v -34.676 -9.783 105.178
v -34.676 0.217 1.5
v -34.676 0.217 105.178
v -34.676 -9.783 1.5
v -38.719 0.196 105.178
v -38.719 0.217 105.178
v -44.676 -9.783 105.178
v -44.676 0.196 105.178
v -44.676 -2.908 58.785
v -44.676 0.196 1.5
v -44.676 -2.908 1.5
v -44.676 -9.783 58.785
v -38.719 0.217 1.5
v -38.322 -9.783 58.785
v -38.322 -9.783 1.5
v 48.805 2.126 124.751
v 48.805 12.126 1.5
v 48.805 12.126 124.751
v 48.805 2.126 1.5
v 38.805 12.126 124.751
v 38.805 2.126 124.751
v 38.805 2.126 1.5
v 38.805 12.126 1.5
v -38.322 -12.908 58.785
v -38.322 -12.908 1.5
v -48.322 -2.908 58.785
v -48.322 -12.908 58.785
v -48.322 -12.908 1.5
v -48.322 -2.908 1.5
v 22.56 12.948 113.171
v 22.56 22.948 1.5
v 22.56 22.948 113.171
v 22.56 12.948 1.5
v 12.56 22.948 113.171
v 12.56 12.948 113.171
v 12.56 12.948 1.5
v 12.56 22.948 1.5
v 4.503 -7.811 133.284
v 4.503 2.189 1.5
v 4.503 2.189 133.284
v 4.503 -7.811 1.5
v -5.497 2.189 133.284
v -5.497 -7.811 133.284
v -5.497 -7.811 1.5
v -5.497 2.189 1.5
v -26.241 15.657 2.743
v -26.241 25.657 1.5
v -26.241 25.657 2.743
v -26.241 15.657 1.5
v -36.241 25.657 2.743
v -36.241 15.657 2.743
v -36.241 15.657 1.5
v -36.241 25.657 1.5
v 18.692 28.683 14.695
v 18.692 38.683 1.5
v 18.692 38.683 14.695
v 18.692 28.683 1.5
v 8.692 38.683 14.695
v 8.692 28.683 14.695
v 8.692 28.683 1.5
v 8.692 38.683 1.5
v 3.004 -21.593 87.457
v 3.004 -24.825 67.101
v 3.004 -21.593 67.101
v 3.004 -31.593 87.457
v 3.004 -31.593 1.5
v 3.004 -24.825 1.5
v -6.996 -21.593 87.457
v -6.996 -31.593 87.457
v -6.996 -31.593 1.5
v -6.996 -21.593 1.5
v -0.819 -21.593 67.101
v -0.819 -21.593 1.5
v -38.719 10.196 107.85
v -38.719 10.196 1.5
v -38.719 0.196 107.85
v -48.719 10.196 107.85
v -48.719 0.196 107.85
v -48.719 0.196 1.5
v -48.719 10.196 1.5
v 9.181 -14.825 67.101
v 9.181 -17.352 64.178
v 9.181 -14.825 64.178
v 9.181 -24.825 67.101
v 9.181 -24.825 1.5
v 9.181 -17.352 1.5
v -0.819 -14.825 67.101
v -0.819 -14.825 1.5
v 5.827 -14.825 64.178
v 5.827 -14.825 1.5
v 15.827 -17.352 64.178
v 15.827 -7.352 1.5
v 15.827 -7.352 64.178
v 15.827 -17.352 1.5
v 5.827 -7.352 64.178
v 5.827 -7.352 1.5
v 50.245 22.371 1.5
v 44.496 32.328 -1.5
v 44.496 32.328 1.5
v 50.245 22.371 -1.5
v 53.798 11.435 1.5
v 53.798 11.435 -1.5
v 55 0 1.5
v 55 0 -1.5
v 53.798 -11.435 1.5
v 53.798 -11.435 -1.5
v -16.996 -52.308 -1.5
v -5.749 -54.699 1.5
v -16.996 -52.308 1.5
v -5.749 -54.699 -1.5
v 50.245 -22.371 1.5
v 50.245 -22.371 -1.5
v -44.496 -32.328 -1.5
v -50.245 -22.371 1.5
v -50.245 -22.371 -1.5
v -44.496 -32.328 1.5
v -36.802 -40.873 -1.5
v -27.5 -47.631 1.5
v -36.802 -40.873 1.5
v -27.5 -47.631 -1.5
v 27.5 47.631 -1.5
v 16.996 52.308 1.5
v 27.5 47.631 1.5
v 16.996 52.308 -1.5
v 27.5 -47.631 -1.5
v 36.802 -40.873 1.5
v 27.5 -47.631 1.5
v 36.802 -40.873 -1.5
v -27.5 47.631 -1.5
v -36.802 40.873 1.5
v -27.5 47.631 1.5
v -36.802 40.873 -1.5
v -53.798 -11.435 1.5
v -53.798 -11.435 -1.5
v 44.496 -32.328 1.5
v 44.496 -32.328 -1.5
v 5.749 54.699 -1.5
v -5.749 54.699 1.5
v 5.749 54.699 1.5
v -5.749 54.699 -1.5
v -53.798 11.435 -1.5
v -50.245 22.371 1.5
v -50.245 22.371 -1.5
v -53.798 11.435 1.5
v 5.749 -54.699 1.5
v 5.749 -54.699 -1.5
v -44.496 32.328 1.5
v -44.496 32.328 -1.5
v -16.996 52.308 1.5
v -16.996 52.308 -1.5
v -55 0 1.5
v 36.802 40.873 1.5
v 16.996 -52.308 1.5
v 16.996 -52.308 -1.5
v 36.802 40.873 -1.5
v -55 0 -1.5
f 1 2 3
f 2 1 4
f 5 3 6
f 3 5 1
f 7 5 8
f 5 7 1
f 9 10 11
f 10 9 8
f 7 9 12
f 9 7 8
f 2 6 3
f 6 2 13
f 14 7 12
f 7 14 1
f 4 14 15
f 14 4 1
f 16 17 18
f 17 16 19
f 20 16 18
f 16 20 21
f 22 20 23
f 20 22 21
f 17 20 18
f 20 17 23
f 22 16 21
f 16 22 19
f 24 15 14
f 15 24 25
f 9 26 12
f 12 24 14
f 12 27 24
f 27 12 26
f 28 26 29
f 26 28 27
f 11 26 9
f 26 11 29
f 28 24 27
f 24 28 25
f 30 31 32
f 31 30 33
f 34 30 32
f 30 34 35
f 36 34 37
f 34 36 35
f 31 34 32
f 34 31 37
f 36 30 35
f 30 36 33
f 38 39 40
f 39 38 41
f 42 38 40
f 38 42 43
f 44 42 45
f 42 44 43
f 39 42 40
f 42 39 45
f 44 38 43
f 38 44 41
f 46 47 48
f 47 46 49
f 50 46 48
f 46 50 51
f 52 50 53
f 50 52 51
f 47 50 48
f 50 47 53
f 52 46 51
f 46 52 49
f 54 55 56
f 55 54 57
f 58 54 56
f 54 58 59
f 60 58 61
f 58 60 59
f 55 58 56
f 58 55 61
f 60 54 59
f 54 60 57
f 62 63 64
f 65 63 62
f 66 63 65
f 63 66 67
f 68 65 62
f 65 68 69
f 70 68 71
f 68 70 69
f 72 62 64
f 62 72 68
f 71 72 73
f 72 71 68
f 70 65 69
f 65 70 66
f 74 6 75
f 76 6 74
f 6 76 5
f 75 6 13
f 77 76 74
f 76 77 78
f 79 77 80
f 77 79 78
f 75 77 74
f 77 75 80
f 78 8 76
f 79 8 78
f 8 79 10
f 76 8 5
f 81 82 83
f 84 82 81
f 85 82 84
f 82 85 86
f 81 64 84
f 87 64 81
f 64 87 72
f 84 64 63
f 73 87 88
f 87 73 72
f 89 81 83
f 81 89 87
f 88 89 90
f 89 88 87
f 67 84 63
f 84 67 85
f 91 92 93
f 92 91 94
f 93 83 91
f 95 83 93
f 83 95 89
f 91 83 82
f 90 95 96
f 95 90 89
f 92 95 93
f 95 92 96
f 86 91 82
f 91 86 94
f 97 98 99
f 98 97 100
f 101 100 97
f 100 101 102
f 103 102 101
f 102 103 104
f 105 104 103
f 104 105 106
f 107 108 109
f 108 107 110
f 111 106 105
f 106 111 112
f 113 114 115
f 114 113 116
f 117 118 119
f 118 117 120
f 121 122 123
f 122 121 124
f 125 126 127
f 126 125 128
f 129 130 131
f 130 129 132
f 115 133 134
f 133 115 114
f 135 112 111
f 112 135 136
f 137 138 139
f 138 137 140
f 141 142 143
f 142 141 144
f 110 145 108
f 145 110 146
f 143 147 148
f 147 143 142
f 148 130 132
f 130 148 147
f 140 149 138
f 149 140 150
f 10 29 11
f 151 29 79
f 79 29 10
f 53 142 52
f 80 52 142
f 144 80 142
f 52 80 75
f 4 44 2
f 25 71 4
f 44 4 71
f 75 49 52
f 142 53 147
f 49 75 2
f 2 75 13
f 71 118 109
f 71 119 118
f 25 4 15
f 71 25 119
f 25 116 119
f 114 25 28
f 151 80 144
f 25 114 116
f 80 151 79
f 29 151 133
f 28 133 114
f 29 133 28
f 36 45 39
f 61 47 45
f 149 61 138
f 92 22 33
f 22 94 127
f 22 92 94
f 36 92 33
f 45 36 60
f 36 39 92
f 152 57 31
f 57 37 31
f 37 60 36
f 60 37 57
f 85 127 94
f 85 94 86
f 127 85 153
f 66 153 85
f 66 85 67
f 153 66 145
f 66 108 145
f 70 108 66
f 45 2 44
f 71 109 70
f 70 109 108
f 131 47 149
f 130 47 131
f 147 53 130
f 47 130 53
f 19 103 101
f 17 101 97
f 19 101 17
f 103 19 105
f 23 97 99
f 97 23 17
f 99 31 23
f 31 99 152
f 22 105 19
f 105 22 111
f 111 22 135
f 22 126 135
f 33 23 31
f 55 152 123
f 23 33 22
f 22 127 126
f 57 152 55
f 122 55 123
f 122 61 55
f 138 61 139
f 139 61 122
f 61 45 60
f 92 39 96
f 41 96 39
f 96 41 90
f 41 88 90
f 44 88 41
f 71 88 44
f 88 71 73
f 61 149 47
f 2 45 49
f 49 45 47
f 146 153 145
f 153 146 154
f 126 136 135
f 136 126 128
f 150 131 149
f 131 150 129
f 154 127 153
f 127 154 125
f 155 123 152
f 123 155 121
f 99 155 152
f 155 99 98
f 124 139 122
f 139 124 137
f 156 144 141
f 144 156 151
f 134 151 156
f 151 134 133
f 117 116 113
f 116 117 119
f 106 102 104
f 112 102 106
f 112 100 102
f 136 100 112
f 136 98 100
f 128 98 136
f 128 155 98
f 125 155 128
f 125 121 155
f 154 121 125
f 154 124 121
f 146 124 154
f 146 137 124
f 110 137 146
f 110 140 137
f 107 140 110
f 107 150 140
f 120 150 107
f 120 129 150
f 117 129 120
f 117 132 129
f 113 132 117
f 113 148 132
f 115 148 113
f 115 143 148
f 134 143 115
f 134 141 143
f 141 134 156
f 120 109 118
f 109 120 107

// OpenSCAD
radius = 55;
number_of_tower = 10;
tower_size = 10;
max_tower_height = 150;
disk_height = 3;

cylinder(disk_height,   radius, radius,true);
for(i=[0:number_of_tower]) {
    
    height = rands(0,max_tower_height,1)[0];
    tx = rands(tower_size-radius,radius-tower_size,1)[0];
    maxy = sqrt(pow(radius-tower_size, 2) - pow(tx, 2));
    ty = rands(-maxy,maxy,1)[0];
    
    translate([tx,ty,height/2]) cube([tower_size,tower_size,height], true);
}
